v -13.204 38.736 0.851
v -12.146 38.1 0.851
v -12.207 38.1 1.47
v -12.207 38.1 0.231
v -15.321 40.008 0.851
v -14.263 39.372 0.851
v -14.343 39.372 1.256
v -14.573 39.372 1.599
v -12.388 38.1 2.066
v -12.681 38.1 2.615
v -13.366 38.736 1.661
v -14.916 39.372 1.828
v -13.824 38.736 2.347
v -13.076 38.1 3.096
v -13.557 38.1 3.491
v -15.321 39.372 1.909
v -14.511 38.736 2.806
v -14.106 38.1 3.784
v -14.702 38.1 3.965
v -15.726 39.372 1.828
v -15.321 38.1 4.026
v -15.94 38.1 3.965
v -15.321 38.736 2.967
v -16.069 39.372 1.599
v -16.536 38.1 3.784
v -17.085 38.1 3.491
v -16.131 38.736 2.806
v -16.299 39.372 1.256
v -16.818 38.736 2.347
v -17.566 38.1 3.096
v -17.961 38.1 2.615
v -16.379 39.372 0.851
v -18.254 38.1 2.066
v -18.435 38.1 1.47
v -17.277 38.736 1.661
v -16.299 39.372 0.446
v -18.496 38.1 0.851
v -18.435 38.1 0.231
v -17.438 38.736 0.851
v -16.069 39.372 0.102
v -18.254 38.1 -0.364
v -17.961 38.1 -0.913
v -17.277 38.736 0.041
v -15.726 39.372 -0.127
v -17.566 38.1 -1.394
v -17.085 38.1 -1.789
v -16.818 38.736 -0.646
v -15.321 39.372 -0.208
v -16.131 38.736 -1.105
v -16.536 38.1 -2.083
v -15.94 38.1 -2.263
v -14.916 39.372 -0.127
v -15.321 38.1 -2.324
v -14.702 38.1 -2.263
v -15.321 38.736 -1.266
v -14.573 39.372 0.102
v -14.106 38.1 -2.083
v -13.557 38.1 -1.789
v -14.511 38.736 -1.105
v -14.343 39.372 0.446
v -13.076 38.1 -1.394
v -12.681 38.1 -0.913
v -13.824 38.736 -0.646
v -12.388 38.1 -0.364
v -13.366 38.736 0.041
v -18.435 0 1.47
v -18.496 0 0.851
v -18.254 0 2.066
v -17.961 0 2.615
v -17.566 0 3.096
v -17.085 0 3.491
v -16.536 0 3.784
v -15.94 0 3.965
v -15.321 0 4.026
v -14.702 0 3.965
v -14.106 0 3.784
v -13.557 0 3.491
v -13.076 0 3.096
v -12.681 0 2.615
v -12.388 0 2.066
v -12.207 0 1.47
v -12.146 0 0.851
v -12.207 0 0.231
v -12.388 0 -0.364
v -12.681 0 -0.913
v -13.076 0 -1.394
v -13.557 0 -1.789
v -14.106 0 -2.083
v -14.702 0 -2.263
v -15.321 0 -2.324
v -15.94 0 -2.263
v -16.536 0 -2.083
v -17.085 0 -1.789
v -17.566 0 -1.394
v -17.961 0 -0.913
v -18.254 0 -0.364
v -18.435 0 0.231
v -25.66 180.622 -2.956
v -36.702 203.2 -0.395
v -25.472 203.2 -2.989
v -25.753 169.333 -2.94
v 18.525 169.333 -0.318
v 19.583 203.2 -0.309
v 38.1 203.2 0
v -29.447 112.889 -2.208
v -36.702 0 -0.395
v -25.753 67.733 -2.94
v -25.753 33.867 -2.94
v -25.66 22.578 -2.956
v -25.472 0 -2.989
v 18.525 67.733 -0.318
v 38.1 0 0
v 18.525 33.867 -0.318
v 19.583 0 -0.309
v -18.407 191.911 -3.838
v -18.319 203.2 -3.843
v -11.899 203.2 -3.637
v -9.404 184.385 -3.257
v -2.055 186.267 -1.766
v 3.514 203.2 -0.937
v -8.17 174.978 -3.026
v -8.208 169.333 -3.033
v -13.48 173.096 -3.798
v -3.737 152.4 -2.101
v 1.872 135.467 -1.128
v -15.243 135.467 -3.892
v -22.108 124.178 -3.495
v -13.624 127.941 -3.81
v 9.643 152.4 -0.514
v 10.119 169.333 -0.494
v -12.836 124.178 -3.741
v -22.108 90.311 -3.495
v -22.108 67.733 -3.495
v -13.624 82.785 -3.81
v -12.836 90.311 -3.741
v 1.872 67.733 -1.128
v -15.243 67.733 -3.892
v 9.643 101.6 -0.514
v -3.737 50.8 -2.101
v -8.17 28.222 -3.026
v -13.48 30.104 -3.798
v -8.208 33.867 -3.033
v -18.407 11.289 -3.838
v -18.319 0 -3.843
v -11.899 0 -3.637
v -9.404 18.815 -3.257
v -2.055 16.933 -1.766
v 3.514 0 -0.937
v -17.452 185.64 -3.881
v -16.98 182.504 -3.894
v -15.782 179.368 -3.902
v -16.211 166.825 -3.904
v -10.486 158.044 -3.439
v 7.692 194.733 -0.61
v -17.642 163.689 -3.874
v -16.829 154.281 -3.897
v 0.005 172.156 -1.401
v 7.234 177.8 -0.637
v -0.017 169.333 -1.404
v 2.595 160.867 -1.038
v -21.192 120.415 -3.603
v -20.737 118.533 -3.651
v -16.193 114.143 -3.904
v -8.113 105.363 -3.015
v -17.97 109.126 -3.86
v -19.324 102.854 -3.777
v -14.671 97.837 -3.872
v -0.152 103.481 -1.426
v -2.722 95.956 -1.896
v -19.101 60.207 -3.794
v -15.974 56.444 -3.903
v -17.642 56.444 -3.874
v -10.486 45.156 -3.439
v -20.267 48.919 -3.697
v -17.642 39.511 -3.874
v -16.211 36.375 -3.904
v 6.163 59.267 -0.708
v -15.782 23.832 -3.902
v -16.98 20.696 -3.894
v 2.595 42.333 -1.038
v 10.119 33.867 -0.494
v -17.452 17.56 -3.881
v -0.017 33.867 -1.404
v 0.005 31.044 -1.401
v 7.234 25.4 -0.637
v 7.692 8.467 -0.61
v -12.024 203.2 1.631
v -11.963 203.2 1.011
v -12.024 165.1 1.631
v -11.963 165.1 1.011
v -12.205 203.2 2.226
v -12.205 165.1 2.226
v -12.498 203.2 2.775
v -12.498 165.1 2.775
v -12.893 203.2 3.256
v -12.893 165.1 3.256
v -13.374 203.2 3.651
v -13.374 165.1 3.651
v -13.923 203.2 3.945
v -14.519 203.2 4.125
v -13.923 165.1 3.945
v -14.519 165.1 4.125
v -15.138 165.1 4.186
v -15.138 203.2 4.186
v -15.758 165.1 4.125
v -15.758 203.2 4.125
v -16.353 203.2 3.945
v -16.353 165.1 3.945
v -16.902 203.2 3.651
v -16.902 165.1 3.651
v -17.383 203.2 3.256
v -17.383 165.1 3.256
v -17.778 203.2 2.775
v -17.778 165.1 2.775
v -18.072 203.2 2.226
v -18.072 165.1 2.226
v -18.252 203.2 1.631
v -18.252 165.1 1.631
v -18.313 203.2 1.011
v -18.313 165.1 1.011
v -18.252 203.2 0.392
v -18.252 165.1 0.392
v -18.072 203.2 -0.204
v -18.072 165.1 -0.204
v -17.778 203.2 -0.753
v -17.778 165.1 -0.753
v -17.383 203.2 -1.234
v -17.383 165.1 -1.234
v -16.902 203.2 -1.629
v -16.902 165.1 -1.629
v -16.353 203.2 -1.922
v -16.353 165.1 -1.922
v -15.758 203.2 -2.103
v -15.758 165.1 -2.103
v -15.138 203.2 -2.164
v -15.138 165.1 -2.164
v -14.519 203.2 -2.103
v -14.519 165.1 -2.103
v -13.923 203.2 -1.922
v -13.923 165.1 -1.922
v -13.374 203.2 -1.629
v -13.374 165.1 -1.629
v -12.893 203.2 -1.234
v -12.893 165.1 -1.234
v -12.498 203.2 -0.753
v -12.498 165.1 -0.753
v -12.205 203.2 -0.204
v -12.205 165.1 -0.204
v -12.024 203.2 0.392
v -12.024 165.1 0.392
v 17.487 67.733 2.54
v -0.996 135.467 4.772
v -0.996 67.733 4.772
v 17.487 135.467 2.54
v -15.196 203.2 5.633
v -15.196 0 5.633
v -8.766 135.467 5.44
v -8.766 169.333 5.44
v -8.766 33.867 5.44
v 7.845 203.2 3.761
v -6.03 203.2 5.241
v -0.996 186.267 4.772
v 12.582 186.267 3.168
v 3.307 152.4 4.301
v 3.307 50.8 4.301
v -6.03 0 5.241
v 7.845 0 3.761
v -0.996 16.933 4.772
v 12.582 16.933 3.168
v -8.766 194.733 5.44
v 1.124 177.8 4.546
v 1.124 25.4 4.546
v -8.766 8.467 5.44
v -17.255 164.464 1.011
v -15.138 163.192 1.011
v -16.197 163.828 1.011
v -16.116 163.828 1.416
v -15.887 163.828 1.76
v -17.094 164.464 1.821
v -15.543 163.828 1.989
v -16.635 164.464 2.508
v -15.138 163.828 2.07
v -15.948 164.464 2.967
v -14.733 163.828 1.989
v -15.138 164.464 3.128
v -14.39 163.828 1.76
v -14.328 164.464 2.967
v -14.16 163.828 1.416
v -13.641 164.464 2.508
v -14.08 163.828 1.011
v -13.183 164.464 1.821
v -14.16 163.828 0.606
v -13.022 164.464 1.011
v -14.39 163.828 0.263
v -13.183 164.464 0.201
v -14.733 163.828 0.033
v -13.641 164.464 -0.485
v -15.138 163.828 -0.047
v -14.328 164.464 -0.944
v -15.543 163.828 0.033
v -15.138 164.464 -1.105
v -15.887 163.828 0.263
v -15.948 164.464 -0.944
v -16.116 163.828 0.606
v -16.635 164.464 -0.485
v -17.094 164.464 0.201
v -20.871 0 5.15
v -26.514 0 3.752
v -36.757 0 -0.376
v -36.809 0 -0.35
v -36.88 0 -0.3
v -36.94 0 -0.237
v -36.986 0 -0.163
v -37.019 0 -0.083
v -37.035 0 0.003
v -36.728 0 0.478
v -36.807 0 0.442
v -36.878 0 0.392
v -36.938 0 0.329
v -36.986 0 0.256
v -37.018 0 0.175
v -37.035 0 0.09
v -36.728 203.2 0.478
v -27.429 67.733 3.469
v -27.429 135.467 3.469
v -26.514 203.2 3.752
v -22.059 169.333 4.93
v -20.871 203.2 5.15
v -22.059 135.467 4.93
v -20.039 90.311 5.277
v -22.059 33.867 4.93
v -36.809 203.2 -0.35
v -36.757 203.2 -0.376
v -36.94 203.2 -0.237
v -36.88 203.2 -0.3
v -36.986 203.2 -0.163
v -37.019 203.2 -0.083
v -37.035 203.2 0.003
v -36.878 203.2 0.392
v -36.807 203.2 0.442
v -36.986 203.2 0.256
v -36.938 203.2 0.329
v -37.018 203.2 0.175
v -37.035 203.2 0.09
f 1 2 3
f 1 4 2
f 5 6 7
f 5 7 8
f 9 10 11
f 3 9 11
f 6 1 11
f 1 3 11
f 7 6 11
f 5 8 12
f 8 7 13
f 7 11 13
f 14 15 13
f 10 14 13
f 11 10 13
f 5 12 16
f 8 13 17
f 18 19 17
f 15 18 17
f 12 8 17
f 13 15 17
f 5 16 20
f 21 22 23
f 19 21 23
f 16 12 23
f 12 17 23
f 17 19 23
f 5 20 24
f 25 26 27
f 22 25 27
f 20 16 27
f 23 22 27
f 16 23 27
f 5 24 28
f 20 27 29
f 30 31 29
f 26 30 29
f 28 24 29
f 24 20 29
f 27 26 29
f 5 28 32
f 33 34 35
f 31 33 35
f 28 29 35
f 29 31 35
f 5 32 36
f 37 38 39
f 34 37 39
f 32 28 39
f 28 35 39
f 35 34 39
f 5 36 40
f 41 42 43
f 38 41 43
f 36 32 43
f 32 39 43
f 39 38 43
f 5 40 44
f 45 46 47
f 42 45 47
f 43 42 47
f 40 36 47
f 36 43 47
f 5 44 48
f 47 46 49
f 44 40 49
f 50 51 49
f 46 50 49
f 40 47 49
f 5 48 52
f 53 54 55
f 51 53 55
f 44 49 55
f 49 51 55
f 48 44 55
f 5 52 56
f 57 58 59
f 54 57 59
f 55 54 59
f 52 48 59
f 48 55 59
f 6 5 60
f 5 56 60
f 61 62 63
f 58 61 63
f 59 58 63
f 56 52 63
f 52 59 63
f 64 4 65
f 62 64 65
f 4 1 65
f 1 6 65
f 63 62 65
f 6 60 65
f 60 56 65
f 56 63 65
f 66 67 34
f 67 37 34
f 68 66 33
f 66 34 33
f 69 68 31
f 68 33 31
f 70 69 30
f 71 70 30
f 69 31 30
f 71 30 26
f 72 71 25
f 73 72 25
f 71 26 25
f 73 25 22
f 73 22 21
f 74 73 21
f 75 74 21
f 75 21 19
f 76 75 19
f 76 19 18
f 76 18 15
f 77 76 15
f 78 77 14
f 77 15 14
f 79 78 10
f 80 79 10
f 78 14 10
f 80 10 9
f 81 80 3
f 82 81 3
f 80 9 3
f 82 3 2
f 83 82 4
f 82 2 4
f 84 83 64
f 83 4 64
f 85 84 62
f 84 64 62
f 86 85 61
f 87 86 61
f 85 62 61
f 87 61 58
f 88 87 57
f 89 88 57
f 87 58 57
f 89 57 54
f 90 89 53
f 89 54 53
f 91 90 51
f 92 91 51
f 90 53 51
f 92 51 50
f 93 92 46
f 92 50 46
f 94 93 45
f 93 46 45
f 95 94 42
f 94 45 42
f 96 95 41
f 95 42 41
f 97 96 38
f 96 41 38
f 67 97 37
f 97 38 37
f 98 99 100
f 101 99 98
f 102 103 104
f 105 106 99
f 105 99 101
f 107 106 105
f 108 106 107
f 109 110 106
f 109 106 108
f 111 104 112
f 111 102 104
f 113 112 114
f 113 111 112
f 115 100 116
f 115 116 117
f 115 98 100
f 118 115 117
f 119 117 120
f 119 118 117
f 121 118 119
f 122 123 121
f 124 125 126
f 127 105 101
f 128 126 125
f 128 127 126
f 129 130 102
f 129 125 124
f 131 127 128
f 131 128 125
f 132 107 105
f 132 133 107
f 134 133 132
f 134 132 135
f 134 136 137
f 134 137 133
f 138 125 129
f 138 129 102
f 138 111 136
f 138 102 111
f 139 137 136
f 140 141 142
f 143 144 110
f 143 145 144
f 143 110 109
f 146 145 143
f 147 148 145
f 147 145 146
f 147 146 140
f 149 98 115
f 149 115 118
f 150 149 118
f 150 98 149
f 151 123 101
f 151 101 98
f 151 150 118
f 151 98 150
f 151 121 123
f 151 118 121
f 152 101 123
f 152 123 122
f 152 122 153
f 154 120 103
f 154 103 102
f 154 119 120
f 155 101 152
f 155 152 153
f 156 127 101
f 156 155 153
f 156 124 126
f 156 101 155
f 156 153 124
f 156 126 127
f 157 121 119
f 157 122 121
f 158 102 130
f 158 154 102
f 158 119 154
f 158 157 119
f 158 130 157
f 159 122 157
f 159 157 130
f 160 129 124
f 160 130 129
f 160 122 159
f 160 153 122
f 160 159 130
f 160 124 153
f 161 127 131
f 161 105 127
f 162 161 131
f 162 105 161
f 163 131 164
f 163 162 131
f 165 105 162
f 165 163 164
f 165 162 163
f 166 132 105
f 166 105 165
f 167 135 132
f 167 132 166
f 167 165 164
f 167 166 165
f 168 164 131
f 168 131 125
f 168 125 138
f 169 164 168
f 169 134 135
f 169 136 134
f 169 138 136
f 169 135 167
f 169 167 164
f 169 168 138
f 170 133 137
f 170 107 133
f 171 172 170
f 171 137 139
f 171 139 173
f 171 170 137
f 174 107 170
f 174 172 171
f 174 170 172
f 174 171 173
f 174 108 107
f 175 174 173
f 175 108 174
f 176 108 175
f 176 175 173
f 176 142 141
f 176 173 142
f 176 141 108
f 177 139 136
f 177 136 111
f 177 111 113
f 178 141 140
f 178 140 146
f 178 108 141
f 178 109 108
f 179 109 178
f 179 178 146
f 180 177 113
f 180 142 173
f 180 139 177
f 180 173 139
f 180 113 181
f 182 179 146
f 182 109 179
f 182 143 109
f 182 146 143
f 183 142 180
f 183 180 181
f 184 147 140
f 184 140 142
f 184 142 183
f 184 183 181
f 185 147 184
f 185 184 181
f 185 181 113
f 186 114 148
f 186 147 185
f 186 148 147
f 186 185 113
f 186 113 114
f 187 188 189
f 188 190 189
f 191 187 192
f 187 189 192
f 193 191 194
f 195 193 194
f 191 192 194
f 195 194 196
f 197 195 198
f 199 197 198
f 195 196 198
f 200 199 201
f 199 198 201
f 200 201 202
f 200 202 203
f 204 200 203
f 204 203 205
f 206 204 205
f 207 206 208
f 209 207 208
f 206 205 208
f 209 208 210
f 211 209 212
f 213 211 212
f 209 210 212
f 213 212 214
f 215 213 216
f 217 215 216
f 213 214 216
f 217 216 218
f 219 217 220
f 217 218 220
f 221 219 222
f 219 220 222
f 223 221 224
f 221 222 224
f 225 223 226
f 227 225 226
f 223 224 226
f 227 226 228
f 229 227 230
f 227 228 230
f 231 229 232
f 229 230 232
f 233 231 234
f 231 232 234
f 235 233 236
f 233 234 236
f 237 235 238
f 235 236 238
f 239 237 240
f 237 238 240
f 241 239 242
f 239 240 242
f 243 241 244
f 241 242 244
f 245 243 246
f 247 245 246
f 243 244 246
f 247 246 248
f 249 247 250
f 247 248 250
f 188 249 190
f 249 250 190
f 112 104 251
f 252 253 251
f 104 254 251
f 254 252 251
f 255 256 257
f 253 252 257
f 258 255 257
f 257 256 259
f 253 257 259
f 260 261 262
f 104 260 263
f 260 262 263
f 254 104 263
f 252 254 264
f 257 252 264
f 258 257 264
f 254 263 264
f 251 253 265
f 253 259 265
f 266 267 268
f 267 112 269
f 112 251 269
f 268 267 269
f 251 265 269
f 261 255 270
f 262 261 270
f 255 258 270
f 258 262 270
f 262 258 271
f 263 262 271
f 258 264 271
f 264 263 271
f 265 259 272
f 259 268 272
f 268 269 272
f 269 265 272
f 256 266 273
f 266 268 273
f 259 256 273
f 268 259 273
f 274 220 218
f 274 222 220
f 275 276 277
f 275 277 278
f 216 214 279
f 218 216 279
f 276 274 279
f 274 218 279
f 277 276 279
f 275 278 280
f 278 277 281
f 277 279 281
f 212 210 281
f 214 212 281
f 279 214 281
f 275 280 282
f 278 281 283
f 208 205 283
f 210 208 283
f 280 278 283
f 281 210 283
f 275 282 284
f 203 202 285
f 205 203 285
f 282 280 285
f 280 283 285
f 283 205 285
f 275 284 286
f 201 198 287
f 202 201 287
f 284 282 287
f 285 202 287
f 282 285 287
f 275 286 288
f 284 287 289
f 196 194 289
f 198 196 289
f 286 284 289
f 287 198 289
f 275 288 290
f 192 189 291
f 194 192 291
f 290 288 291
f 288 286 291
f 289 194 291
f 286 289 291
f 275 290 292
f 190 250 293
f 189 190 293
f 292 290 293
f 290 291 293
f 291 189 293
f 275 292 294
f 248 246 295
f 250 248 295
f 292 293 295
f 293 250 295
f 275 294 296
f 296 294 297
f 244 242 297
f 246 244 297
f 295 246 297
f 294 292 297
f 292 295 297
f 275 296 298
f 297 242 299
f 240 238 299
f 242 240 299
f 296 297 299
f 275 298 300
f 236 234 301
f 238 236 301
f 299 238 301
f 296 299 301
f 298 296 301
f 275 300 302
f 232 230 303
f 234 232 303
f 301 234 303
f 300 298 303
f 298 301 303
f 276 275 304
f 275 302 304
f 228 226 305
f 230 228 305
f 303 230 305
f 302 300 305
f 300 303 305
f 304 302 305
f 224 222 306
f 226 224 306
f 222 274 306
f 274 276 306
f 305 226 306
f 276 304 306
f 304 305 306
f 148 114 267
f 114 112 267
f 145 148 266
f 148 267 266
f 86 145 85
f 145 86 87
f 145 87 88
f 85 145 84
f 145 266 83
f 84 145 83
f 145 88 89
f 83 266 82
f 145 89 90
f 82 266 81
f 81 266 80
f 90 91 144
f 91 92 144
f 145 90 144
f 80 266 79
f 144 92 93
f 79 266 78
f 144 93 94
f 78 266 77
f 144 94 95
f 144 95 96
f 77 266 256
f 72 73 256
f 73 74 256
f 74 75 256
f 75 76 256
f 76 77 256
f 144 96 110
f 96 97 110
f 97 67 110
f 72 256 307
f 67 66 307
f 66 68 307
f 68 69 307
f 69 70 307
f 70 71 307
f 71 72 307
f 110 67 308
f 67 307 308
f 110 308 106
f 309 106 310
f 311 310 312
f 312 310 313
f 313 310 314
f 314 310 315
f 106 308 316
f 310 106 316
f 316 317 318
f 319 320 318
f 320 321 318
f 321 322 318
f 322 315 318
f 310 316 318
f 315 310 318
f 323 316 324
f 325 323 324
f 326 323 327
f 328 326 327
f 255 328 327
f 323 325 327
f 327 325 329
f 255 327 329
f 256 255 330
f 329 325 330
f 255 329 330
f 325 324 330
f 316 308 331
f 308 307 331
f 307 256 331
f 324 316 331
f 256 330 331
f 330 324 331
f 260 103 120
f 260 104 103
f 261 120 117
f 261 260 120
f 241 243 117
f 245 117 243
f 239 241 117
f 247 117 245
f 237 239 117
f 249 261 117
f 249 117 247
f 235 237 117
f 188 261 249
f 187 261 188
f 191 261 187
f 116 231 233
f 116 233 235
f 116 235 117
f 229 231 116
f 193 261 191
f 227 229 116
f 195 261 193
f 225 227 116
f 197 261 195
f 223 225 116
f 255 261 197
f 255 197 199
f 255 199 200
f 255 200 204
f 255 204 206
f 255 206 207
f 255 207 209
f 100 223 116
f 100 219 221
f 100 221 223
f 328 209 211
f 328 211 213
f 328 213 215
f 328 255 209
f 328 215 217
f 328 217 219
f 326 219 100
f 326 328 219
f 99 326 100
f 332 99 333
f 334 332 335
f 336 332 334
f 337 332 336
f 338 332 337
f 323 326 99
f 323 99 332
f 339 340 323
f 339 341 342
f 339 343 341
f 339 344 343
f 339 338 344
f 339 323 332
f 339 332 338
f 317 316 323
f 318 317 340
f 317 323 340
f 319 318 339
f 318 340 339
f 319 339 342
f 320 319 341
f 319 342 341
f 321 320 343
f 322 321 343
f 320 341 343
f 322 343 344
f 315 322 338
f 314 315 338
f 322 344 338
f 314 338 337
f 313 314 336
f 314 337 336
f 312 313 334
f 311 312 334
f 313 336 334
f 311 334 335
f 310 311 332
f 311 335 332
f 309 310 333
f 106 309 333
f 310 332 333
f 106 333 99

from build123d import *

# Parameters (mm, degrees)
F1_DEPTH = 203.2
F2_R     = 0.4572
F4_D     = 6.35
F4_DEPTH = 38.1
F4_TIP   = 1.9077324654
F6_D     = 6.35
F6_DEPTH = 38.1
F6_TIP   = 1.9077324654


with BuildPart() as f1:
    # F0 (on Front) → F1 (new body)
    with BuildSketch(Plane.XZ):
        with BuildLine():
            add(Edge.make_bspline(
                [(-38.1, 0), (-34.4441864827, 1.2920368177), (-26.95104764, 3.6195004694), (-20.7833617632, 5.5276849917), (-15.2969222444, 5.630961033), (-15.1960243732, 5.6325568112)],
                knots=[0, 0, 0, 0, 0.2363471103, 0.4820415784, 0.4866091448, 0.4866091448, 0.4866091448, 0.4866091448], degree=3))
            add(Edge.make_bspline(
                [(-38.1, 0), (-30.7497908276, -2.1111429684), (-14.6549478088, -5.7693781378), (2.035200574, 0.5658720515), (24.7528447254, -0.5727221795), (38.1, 0)],
                knots=[0, 0, 0, 0, 0.3210287592, 0.5986235858, 1, 1, 1, 1], degree=3))
            add(Edge.make_bspline(
                [(-15.1960243732, 5.6325568112), (-3.8551833656, 5.8119210215), (17.1392039574, 2.3385772884), (38.1, 0)],
                knots=[0.4866091448, 0.4866091448, 0.4866091448, 0.4866091448, 1, 1, 1, 1], degree=3))
        make_face()
    extrude(amount=-F1_DEPTH)

    # F2
    f2_edges = [f1.edges().sort_by_distance(p)[0] for p in [
        (-38.1, 101.6, 0),
    ]]
    fillet(f2_edges, radius=F2_R)

    # F4
    with Locations(Plane(origin=(0, 203.2, 0), x_dir=(-1, 0, 0), z_dir=(0, 1, 0))):
        with Locations((15.1381986216, 1.0112618329)):
            Hole(F4_D / 2, depth=F4_DEPTH)
            with Locations((0, 0, -(F4_DEPTH + F4_TIP / 2))):  # 118° drill point
                Cone(0, F4_D / 2, F4_TIP, mode=Mode.SUBTRACT)

    # F6
    with Locations(Plane.XZ):
        with Locations((-15.3210880235, 0.8506519371)):
            Hole(F6_D / 2, depth=F6_DEPTH)
            with Locations((0, 0, -(F6_DEPTH + F6_TIP / 2))):  # 118° drill point
                Cone(0, F6_D / 2, F6_TIP, mode=Mode.SUBTRACT)


solid = f1.part
